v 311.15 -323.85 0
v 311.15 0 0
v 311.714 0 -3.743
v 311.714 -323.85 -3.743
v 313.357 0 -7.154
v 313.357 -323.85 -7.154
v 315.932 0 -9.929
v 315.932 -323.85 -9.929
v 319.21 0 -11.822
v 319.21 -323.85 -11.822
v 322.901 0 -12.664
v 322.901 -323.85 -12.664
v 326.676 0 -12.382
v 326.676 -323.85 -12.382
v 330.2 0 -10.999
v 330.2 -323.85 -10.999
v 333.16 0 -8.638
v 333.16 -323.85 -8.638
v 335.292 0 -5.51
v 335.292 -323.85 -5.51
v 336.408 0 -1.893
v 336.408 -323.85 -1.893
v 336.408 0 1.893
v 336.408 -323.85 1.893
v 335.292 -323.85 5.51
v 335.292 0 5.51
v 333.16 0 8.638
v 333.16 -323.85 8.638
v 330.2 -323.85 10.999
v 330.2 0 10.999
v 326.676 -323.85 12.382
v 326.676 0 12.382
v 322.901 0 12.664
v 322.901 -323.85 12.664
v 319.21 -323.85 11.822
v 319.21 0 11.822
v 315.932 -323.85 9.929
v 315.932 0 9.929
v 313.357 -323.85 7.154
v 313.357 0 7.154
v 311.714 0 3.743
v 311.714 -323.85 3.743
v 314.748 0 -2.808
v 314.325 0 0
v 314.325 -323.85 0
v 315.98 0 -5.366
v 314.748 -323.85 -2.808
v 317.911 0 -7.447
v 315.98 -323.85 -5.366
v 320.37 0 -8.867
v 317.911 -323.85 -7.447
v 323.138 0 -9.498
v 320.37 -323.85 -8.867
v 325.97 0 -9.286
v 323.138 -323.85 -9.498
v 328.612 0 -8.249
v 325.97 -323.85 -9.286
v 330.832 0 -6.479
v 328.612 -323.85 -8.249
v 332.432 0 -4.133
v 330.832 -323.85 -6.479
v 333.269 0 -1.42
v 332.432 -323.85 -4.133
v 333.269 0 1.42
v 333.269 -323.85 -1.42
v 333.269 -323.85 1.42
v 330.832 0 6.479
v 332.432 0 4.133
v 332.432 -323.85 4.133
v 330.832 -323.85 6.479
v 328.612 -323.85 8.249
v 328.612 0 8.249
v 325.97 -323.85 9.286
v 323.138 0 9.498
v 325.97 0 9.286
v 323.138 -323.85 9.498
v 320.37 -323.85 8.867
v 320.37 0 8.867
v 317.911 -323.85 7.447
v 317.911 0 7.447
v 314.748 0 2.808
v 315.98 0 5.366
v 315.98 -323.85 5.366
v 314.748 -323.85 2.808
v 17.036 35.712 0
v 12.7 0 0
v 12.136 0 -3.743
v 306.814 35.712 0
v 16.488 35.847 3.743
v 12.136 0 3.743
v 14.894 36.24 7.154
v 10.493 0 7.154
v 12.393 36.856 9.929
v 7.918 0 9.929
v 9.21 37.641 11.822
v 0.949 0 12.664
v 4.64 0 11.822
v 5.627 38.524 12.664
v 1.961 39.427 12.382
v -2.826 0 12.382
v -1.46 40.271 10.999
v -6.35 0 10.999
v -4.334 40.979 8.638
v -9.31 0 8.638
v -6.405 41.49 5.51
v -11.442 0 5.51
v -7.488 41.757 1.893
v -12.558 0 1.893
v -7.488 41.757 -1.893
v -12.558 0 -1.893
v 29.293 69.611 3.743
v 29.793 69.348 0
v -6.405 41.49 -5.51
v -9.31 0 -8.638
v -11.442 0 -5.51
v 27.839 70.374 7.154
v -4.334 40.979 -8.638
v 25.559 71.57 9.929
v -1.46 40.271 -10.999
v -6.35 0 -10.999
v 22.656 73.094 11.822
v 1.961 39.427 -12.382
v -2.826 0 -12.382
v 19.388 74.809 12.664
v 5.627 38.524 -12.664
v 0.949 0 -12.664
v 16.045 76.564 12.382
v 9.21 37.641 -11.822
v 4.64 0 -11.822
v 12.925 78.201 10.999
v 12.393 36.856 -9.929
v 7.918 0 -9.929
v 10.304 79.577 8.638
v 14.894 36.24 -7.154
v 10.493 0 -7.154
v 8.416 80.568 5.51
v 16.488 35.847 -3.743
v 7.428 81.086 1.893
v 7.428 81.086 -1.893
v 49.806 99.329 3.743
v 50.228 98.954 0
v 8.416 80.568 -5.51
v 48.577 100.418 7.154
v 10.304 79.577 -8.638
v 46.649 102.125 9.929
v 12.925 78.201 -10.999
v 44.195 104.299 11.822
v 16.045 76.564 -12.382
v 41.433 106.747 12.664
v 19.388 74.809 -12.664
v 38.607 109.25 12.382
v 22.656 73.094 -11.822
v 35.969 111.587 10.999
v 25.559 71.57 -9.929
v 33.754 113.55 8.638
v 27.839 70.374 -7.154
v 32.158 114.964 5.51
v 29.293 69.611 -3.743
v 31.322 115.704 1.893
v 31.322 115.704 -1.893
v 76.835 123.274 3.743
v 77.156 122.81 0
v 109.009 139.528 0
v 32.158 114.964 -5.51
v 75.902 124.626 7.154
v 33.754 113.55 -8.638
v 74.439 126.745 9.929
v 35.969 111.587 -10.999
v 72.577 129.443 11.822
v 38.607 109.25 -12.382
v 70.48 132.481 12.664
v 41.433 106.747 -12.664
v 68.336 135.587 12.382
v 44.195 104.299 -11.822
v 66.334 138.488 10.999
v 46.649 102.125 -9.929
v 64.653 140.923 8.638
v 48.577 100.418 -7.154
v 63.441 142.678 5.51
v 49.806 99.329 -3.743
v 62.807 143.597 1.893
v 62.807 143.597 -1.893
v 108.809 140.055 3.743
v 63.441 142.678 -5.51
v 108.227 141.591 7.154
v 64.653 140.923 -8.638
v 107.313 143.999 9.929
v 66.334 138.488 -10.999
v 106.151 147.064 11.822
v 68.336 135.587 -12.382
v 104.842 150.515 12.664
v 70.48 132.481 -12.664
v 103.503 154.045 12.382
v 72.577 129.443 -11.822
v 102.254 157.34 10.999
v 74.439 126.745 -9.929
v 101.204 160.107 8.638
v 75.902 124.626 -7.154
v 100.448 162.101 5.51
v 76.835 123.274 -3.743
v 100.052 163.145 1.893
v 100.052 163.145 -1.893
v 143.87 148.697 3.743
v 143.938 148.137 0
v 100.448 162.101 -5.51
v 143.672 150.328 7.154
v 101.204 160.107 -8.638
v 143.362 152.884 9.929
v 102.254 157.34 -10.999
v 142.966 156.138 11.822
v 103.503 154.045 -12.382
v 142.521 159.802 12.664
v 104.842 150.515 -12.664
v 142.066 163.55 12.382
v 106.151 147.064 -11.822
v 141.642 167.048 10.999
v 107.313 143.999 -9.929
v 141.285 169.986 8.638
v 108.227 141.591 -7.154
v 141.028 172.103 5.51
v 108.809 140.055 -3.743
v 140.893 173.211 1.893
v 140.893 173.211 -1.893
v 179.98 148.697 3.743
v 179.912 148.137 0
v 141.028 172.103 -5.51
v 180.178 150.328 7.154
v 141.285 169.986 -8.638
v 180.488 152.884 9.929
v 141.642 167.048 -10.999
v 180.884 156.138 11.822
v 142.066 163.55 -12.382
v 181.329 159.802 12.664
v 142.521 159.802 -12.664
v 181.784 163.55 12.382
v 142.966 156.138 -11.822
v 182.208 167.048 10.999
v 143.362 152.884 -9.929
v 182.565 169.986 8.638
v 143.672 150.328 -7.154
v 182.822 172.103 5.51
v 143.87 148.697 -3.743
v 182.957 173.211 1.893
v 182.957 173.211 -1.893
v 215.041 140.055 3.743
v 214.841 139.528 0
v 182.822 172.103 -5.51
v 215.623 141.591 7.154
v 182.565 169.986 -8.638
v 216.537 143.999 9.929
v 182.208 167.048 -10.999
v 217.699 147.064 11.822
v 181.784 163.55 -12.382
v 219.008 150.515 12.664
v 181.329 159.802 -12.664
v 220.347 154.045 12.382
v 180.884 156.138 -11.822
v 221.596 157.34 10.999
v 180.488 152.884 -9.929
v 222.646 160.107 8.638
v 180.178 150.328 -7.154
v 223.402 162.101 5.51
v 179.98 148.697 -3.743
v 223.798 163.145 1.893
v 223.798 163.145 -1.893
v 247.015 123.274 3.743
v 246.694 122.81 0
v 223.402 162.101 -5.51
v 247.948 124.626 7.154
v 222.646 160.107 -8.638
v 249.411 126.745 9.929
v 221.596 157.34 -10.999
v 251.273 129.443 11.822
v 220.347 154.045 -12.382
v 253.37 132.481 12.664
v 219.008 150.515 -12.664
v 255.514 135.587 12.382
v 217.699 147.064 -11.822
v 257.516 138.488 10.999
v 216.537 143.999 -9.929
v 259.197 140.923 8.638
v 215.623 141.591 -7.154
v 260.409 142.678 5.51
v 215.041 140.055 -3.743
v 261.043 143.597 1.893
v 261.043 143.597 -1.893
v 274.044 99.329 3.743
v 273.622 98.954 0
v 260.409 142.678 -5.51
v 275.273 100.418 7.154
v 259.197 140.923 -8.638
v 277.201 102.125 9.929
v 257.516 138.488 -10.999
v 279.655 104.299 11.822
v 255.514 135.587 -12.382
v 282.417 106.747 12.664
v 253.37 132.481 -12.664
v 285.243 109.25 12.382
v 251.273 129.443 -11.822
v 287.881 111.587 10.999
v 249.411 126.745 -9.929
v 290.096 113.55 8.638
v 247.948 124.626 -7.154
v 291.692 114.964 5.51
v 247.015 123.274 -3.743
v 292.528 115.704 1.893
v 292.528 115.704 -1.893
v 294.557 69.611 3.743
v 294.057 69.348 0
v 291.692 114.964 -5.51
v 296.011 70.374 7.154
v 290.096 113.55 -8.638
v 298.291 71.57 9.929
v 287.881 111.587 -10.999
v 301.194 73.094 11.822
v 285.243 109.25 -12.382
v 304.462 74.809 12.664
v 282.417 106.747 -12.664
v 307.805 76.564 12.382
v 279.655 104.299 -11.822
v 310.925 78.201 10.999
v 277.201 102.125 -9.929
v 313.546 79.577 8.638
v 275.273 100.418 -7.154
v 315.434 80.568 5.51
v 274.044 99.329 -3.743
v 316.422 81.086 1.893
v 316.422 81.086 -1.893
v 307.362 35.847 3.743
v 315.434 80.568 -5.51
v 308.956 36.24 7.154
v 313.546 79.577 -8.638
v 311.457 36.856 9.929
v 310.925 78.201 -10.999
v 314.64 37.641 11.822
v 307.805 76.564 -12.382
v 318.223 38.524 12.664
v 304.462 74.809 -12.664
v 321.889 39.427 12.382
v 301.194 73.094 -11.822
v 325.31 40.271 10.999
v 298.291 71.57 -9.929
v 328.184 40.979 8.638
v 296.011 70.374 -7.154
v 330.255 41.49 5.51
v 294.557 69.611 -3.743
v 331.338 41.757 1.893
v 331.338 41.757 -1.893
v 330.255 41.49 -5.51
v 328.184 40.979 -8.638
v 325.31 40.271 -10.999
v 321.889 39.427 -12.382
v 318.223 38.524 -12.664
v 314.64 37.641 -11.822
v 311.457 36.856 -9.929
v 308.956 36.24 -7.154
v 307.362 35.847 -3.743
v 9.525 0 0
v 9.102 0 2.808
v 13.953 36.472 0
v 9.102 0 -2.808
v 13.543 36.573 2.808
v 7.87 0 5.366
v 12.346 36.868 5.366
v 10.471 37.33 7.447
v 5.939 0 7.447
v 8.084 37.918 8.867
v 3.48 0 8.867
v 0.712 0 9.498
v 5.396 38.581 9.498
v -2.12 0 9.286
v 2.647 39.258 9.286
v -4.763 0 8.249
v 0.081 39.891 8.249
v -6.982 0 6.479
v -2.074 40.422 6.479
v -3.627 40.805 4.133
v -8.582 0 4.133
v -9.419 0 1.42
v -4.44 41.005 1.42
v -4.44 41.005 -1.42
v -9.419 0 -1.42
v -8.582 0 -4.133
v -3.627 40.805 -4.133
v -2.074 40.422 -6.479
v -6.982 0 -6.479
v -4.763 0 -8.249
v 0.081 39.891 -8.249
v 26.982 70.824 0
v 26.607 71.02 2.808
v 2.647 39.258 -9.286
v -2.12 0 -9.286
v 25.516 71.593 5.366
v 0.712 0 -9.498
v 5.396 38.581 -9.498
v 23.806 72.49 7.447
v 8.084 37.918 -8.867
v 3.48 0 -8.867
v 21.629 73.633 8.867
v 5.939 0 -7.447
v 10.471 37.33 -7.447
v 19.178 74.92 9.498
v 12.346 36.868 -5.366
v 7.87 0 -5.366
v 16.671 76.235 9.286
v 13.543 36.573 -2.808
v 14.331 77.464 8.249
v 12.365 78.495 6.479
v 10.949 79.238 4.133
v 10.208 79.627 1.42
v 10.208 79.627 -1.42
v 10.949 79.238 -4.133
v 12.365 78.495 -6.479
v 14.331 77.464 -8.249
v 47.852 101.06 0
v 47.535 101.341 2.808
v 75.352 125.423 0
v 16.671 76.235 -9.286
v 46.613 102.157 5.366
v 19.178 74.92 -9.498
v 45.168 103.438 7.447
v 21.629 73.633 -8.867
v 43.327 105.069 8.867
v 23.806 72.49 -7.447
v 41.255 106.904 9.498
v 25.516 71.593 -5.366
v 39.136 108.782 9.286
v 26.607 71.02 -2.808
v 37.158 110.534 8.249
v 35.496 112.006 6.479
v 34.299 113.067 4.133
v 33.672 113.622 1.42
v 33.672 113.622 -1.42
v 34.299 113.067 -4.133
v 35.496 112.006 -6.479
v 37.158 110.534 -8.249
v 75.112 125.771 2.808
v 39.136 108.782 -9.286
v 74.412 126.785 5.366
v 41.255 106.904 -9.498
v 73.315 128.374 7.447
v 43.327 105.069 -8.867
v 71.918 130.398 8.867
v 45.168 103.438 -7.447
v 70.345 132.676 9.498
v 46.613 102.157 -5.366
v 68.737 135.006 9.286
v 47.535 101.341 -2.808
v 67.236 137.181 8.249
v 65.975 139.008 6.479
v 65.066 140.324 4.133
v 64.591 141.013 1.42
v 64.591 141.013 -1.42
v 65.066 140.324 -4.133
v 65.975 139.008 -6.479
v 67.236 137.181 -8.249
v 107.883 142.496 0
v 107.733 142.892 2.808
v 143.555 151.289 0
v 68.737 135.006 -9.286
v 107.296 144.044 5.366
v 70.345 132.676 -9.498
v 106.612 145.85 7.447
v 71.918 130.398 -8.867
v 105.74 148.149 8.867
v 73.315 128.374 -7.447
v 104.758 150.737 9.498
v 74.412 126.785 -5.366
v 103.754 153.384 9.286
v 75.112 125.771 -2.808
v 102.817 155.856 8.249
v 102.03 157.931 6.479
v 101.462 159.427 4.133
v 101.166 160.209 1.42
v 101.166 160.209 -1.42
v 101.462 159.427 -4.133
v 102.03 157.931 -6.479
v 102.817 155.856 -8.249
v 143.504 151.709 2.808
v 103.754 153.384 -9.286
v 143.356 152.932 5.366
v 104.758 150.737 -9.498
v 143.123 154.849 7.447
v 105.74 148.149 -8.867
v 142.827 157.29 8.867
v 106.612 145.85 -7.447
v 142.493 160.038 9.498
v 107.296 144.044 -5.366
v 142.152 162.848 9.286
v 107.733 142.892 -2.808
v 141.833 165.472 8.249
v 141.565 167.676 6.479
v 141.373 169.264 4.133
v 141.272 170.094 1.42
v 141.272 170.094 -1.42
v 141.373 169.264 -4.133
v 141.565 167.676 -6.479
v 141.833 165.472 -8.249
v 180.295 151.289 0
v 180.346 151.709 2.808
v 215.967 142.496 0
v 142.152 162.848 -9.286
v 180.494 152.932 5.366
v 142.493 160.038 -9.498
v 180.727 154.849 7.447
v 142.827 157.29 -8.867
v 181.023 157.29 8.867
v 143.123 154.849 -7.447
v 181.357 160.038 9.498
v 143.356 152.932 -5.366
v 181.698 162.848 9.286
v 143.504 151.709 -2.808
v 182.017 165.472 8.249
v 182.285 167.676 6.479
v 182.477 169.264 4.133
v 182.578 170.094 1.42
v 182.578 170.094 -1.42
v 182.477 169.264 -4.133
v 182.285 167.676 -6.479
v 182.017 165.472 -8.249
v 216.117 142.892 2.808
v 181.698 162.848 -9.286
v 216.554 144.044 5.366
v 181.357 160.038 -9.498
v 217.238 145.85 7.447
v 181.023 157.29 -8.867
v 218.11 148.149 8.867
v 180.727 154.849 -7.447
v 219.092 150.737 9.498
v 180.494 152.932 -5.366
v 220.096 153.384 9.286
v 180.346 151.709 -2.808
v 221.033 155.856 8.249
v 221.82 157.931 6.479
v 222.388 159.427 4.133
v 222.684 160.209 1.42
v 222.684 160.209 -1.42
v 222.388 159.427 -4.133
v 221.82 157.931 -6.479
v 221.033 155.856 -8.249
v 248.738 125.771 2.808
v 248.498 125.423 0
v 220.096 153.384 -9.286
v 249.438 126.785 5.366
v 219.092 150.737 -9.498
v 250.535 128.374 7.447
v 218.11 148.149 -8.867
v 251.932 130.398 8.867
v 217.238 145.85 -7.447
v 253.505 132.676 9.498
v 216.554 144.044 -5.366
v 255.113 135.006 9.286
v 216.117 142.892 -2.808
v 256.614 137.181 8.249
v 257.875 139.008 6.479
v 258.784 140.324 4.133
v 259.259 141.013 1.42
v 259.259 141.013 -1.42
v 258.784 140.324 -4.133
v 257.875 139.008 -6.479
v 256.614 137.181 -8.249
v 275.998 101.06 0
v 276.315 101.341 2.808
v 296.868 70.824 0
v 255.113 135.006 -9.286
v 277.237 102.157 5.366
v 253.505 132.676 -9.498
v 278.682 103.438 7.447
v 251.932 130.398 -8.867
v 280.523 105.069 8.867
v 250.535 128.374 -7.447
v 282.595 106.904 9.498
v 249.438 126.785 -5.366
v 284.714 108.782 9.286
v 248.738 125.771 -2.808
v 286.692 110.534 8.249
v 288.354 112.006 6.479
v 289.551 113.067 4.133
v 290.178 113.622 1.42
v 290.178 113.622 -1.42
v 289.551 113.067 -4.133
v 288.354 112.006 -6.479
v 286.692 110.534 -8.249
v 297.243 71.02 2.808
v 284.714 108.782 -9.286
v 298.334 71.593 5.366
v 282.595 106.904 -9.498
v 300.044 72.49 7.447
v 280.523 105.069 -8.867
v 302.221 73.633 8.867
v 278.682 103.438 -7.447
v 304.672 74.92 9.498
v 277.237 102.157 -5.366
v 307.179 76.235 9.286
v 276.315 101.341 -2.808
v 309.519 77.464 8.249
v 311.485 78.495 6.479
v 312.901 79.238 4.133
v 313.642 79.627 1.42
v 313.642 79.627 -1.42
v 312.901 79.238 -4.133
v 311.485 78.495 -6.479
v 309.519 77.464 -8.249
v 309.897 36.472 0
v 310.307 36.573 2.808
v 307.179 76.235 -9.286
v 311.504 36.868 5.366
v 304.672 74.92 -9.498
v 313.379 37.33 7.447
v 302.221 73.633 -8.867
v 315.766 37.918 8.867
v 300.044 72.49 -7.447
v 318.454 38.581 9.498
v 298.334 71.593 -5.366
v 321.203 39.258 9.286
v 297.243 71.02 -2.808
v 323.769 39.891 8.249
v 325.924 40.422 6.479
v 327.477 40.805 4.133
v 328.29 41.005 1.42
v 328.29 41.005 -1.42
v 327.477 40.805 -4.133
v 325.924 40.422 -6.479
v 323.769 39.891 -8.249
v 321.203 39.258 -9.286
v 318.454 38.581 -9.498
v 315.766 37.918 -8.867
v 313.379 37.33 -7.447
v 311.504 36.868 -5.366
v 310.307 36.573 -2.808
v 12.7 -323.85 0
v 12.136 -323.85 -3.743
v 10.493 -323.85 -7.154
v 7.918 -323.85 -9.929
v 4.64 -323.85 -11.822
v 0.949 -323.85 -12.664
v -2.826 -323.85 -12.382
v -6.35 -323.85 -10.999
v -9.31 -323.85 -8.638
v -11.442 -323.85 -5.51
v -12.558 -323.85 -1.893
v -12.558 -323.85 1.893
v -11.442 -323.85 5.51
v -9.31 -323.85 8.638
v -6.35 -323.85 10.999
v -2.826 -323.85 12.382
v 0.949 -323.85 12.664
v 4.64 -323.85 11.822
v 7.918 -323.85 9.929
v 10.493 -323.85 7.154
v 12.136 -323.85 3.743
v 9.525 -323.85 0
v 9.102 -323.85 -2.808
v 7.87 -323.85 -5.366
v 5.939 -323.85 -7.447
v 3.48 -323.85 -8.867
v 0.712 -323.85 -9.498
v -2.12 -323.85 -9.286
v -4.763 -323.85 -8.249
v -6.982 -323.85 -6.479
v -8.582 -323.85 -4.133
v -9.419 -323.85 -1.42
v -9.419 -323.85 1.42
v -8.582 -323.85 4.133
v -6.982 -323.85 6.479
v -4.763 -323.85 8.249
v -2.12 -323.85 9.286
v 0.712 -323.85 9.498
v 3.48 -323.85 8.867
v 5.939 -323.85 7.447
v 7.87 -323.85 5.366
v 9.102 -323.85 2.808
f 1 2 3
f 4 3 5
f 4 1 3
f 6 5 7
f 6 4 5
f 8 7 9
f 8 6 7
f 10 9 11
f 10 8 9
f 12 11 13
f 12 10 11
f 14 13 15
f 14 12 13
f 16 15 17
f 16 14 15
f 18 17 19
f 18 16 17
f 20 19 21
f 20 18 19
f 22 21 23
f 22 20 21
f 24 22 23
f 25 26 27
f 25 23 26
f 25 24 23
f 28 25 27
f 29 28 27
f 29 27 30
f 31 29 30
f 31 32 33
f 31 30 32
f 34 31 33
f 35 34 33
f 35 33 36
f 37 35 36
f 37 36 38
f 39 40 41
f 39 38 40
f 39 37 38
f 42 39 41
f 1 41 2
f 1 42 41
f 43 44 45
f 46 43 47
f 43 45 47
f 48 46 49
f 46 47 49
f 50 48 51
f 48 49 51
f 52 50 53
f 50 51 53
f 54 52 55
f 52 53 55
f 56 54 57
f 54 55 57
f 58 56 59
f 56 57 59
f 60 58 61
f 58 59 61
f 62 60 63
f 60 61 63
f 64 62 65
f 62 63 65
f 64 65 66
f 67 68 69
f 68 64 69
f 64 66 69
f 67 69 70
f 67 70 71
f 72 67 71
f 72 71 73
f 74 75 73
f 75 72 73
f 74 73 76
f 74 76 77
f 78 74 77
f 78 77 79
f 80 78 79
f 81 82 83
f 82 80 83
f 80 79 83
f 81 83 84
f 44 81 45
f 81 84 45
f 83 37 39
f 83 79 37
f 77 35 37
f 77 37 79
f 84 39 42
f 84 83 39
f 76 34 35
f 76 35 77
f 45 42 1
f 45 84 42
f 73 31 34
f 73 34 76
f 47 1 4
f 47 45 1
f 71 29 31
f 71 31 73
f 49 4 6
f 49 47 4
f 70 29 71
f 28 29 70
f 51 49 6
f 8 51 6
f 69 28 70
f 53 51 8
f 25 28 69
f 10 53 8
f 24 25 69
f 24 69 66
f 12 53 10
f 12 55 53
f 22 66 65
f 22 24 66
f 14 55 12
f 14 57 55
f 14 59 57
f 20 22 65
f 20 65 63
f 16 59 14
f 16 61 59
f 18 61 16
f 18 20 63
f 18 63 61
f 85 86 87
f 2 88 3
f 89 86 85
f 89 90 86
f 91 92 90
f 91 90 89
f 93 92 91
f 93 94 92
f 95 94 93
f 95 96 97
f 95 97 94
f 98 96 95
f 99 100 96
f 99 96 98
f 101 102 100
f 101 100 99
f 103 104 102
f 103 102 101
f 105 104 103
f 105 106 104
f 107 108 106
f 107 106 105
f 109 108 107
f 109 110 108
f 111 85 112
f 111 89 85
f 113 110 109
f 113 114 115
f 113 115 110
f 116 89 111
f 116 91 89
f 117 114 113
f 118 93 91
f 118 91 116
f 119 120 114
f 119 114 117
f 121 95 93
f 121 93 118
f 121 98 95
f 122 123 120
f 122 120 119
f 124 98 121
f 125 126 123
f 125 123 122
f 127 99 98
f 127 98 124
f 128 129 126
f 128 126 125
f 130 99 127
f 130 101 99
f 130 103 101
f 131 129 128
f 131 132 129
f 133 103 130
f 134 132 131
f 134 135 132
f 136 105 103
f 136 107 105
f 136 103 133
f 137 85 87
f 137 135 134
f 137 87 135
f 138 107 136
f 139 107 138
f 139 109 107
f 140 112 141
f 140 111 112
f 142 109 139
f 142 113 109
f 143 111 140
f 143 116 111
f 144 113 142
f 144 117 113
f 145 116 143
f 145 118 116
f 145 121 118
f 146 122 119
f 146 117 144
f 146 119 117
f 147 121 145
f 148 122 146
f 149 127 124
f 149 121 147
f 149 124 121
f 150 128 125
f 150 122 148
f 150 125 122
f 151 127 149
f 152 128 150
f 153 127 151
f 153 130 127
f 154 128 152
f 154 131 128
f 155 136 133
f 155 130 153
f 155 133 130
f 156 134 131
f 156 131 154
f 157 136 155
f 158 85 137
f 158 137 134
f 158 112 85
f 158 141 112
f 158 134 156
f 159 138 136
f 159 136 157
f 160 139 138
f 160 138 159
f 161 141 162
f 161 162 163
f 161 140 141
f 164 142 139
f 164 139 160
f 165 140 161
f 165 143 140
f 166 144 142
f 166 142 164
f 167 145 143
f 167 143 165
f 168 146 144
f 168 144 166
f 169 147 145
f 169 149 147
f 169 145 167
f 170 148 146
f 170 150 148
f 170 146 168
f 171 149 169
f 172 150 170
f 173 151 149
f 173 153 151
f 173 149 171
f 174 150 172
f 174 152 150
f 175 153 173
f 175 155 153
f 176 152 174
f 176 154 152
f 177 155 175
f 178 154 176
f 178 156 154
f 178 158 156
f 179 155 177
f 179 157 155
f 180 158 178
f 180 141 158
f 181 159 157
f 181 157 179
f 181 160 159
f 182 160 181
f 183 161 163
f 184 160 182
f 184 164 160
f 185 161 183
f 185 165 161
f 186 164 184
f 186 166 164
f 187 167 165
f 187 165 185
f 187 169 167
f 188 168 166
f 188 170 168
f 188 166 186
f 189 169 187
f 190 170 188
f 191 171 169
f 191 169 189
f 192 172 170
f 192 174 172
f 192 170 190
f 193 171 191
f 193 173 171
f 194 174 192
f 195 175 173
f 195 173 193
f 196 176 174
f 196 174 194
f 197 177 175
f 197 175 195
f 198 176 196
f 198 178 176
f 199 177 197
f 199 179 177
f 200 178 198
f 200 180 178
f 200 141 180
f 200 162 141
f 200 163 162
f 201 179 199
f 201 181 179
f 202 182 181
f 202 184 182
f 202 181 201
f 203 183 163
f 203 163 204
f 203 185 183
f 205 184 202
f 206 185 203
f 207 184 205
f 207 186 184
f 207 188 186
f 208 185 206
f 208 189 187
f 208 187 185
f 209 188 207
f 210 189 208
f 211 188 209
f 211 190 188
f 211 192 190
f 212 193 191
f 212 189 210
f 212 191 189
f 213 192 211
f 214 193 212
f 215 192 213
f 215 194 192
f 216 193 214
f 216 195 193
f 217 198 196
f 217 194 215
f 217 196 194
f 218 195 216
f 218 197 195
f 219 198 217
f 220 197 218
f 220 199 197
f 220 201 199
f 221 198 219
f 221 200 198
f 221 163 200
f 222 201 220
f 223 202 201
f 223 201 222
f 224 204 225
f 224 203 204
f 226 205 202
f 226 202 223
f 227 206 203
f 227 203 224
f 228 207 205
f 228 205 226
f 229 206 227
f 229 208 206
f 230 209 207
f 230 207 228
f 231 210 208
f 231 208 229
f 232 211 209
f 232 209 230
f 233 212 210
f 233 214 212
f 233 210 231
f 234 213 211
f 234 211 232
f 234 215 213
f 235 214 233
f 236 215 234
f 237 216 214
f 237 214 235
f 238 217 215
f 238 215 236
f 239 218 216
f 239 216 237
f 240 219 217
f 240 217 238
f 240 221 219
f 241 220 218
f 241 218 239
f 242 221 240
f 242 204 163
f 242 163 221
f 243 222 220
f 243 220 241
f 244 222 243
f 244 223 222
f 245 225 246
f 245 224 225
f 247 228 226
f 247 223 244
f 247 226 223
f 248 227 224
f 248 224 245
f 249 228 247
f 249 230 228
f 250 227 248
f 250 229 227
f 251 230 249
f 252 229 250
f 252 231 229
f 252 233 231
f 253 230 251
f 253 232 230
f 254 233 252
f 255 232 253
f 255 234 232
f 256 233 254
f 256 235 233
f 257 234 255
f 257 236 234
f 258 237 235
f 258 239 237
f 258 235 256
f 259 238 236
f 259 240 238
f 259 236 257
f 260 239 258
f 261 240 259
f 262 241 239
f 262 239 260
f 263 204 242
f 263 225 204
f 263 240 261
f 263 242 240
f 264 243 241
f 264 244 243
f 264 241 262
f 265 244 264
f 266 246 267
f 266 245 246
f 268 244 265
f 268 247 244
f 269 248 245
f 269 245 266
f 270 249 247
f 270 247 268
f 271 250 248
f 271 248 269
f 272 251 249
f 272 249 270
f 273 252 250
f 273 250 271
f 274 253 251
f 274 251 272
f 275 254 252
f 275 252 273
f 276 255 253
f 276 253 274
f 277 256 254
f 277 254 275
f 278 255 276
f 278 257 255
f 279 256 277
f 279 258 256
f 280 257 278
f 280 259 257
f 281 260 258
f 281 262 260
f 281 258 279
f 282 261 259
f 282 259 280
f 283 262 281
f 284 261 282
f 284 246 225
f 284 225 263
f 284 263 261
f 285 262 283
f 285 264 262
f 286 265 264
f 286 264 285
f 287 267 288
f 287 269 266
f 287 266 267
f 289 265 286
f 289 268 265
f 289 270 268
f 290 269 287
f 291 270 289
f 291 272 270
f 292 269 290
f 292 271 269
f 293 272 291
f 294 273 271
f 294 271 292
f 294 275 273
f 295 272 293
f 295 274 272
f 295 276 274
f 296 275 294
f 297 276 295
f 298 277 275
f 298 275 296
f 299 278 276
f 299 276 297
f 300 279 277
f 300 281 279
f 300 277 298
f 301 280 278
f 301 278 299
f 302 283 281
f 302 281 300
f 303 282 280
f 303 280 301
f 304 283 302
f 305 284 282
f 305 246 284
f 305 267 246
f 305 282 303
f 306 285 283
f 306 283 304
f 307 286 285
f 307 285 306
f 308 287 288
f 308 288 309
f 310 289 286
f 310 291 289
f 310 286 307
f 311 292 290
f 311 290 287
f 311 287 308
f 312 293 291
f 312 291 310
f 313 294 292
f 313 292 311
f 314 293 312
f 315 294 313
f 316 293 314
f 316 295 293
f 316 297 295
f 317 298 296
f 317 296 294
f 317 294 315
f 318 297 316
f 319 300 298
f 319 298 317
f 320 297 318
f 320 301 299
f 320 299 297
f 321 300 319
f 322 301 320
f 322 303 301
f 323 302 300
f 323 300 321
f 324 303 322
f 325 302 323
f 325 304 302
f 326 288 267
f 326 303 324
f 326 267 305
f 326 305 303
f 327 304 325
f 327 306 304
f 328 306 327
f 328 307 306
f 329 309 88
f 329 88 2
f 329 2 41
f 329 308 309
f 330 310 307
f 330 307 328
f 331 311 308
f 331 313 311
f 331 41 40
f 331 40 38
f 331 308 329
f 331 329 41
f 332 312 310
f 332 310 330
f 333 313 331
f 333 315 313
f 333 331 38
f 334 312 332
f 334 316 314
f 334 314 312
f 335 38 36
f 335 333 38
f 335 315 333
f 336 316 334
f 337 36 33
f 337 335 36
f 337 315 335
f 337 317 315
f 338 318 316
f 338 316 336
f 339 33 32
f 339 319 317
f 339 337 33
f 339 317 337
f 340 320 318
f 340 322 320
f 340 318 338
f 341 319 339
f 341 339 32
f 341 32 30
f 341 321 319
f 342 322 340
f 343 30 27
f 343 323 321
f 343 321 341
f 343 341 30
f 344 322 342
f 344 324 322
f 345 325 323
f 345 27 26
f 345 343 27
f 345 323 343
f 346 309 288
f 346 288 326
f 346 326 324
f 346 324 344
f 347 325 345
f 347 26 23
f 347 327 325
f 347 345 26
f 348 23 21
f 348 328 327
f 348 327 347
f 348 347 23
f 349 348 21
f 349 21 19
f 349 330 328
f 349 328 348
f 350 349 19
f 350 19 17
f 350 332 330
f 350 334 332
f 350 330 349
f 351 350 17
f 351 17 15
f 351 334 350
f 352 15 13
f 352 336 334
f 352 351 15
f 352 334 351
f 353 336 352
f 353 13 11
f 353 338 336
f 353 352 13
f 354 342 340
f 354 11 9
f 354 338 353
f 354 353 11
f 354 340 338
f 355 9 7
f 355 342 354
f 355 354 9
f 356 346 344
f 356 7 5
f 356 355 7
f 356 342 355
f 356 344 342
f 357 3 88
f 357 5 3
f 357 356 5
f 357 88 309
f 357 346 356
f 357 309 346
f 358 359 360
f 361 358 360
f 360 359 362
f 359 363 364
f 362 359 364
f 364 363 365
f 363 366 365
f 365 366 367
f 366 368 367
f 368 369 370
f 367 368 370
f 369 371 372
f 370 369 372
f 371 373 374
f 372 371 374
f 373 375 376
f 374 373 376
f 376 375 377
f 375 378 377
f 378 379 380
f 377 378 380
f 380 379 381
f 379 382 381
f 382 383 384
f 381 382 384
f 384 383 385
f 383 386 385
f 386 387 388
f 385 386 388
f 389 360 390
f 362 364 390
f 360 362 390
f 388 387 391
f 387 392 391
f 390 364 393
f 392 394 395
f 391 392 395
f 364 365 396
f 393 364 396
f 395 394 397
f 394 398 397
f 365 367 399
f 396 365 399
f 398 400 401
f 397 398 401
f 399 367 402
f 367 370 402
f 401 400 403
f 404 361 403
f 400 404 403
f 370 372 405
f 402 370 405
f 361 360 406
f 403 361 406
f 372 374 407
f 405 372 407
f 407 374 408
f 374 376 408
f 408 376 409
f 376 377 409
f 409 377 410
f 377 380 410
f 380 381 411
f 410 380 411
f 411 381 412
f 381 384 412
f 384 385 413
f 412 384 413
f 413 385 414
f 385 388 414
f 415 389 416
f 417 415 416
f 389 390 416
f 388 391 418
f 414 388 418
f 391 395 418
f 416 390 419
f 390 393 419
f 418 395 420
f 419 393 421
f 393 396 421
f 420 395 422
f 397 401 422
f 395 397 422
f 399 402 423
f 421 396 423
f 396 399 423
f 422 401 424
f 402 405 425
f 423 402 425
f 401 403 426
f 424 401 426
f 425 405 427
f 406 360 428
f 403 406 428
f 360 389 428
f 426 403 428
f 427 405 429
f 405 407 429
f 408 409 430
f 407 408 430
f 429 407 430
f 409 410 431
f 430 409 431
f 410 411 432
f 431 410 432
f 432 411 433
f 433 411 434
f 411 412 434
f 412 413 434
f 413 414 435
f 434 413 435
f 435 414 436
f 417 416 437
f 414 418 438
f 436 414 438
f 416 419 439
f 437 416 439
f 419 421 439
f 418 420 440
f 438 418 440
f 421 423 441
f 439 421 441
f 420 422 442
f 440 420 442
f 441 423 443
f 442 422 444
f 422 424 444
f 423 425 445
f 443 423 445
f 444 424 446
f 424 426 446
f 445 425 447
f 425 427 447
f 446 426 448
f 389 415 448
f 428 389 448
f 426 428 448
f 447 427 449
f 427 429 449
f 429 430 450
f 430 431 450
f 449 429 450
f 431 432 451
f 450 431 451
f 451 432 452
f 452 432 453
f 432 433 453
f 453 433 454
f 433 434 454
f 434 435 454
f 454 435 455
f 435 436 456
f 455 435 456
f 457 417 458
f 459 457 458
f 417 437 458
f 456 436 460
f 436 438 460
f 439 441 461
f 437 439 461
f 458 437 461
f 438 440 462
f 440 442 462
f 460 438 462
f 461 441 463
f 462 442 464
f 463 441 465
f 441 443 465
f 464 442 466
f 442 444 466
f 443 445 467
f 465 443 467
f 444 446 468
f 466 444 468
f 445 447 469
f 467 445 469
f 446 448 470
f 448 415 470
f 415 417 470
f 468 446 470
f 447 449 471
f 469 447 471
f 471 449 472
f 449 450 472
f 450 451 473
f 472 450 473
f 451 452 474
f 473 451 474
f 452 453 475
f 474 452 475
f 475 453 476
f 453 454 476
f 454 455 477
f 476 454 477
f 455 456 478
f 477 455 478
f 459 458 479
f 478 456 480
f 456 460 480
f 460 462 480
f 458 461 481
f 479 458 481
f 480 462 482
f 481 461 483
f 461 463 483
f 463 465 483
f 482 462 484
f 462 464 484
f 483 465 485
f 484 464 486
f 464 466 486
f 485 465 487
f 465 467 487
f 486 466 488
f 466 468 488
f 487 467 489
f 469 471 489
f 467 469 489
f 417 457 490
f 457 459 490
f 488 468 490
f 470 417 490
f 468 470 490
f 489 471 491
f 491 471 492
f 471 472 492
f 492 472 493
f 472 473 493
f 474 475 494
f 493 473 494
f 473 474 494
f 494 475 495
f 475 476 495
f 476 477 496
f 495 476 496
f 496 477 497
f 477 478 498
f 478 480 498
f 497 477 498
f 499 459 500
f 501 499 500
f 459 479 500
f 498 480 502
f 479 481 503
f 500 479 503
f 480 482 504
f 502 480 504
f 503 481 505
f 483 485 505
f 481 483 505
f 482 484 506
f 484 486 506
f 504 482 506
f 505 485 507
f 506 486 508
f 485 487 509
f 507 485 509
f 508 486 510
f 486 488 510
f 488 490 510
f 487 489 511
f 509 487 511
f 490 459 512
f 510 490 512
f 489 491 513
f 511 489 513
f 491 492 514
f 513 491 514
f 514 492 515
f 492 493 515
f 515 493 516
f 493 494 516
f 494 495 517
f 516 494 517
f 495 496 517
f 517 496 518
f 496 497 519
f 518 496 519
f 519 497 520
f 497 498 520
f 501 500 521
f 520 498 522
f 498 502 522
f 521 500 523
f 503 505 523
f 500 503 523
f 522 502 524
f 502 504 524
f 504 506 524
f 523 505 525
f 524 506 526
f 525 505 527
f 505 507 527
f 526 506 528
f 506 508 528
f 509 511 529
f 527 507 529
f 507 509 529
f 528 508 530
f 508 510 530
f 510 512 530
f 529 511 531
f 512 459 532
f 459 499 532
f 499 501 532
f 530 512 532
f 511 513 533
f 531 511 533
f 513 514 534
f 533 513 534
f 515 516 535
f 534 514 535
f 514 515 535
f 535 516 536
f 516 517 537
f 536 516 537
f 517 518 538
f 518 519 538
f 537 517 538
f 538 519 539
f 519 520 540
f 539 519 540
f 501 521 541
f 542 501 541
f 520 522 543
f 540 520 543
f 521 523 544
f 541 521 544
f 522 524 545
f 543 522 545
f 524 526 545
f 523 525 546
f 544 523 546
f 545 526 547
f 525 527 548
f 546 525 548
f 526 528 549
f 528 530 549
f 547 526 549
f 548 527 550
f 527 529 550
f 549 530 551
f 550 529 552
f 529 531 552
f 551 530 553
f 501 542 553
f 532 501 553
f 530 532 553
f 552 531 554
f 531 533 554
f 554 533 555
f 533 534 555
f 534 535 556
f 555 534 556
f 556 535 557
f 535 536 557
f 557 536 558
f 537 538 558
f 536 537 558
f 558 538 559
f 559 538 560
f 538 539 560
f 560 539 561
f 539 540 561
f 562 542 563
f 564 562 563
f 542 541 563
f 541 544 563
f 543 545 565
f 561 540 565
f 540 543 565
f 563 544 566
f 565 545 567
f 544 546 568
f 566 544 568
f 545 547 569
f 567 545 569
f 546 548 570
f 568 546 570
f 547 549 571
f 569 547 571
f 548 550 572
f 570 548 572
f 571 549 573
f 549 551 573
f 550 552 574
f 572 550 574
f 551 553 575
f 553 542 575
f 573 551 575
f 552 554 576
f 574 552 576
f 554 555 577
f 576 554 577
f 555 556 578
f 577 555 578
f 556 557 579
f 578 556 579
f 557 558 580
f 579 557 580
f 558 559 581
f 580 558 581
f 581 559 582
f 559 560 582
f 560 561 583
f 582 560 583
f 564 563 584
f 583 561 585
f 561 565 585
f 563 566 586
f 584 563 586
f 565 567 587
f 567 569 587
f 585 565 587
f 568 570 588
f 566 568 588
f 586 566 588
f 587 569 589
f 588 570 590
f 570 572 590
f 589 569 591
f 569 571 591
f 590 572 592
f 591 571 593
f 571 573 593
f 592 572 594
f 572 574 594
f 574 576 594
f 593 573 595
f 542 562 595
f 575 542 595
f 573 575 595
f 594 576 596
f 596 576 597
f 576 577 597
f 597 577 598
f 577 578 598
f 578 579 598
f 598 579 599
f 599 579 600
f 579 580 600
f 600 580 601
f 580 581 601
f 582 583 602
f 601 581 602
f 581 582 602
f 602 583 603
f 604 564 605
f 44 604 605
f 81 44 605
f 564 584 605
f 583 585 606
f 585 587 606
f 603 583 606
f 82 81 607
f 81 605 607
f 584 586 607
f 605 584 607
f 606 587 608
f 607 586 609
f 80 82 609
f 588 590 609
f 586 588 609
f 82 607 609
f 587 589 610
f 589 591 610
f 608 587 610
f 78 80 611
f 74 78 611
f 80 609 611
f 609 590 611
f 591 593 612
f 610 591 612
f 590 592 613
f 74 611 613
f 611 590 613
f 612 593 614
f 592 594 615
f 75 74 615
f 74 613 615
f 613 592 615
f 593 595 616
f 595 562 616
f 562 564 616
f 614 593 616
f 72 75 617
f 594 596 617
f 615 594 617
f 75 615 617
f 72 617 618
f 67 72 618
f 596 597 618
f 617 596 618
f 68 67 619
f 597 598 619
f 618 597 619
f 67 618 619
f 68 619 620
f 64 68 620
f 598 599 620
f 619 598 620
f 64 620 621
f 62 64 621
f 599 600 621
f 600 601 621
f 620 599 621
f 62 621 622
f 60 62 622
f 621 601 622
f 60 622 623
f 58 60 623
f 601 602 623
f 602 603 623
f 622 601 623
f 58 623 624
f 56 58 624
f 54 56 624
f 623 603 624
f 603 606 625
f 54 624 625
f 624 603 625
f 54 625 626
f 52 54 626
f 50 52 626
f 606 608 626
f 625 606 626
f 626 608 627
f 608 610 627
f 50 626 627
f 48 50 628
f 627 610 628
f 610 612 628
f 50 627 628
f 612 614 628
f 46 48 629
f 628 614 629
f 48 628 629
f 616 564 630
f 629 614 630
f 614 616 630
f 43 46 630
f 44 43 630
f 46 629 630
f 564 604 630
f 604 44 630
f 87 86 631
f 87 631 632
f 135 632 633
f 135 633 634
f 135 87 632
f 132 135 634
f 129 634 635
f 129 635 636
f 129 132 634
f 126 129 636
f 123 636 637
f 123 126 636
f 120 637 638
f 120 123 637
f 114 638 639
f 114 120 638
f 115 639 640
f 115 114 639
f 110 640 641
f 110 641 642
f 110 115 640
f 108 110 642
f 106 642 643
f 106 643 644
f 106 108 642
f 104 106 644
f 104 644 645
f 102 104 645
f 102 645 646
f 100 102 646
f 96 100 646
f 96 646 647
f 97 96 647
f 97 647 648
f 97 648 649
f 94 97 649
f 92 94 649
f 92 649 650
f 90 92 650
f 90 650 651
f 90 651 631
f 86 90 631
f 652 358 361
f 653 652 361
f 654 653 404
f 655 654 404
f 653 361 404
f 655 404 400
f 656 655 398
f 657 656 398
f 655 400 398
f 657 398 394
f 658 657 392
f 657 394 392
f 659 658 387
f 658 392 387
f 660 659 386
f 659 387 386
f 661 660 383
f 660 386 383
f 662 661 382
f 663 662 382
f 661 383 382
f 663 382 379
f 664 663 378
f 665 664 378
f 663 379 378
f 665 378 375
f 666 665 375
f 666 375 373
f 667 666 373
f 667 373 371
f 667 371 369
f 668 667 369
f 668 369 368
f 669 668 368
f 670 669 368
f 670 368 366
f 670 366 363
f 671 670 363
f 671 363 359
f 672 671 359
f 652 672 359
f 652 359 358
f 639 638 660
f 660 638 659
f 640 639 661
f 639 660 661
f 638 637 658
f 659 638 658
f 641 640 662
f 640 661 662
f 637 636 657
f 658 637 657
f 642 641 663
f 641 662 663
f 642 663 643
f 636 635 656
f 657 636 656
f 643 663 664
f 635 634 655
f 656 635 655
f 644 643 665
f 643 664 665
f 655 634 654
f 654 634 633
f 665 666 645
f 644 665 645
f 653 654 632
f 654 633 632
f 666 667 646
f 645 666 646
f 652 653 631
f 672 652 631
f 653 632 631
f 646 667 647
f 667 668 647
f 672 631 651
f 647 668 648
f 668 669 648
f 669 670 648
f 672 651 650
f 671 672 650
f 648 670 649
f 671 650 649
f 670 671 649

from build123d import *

# Parameters (mm, degrees)
SKETCH2_R = 12.7
SKETCH3_R = 9.525


with BuildPart() as part:
    # Sweep2: sweep along a path in Sketch1
    with BuildLine(Plane.XY) as sweep2_path:
        Line((0, -323.85), (0, 0))
        ThreePointArc((0, 0), (161.925, 161.925), (323.85, 0))
        Line((323.85, 0), (323.85, -323.85))
    # Sketch2 → Sweep2 (sweep)
    with BuildSketch(Plane(origin=(0, 0, 0), x_dir=(1, 0, 0), z_dir=(0, 1, 0))):
        Circle(SKETCH2_R)
    sweep(path=sweep2_path.line)

    # Cut-Sweep1: sweep along a path in Sketch1<6>
    with BuildLine(Plane.XY) as cut_sweep1_path:
        Line((0, -323.85), (0, 0))
        ThreePointArc((0, 0), (161.925, 161.925), (323.85, 0))
        Line((323.85, 0), (323.85, -323.85))
    # Sketch3 → Cut-Sweep1 (sweep, cut)
    with BuildSketch(Plane(origin=(0, 0, 0), x_dir=(1, 0, 0), z_dir=(0, 1, 0))):
        Circle(SKETCH3_R)
    sweep(path=cut_sweep1_path.line, mode=Mode.SUBTRACT)


solid = part.part
